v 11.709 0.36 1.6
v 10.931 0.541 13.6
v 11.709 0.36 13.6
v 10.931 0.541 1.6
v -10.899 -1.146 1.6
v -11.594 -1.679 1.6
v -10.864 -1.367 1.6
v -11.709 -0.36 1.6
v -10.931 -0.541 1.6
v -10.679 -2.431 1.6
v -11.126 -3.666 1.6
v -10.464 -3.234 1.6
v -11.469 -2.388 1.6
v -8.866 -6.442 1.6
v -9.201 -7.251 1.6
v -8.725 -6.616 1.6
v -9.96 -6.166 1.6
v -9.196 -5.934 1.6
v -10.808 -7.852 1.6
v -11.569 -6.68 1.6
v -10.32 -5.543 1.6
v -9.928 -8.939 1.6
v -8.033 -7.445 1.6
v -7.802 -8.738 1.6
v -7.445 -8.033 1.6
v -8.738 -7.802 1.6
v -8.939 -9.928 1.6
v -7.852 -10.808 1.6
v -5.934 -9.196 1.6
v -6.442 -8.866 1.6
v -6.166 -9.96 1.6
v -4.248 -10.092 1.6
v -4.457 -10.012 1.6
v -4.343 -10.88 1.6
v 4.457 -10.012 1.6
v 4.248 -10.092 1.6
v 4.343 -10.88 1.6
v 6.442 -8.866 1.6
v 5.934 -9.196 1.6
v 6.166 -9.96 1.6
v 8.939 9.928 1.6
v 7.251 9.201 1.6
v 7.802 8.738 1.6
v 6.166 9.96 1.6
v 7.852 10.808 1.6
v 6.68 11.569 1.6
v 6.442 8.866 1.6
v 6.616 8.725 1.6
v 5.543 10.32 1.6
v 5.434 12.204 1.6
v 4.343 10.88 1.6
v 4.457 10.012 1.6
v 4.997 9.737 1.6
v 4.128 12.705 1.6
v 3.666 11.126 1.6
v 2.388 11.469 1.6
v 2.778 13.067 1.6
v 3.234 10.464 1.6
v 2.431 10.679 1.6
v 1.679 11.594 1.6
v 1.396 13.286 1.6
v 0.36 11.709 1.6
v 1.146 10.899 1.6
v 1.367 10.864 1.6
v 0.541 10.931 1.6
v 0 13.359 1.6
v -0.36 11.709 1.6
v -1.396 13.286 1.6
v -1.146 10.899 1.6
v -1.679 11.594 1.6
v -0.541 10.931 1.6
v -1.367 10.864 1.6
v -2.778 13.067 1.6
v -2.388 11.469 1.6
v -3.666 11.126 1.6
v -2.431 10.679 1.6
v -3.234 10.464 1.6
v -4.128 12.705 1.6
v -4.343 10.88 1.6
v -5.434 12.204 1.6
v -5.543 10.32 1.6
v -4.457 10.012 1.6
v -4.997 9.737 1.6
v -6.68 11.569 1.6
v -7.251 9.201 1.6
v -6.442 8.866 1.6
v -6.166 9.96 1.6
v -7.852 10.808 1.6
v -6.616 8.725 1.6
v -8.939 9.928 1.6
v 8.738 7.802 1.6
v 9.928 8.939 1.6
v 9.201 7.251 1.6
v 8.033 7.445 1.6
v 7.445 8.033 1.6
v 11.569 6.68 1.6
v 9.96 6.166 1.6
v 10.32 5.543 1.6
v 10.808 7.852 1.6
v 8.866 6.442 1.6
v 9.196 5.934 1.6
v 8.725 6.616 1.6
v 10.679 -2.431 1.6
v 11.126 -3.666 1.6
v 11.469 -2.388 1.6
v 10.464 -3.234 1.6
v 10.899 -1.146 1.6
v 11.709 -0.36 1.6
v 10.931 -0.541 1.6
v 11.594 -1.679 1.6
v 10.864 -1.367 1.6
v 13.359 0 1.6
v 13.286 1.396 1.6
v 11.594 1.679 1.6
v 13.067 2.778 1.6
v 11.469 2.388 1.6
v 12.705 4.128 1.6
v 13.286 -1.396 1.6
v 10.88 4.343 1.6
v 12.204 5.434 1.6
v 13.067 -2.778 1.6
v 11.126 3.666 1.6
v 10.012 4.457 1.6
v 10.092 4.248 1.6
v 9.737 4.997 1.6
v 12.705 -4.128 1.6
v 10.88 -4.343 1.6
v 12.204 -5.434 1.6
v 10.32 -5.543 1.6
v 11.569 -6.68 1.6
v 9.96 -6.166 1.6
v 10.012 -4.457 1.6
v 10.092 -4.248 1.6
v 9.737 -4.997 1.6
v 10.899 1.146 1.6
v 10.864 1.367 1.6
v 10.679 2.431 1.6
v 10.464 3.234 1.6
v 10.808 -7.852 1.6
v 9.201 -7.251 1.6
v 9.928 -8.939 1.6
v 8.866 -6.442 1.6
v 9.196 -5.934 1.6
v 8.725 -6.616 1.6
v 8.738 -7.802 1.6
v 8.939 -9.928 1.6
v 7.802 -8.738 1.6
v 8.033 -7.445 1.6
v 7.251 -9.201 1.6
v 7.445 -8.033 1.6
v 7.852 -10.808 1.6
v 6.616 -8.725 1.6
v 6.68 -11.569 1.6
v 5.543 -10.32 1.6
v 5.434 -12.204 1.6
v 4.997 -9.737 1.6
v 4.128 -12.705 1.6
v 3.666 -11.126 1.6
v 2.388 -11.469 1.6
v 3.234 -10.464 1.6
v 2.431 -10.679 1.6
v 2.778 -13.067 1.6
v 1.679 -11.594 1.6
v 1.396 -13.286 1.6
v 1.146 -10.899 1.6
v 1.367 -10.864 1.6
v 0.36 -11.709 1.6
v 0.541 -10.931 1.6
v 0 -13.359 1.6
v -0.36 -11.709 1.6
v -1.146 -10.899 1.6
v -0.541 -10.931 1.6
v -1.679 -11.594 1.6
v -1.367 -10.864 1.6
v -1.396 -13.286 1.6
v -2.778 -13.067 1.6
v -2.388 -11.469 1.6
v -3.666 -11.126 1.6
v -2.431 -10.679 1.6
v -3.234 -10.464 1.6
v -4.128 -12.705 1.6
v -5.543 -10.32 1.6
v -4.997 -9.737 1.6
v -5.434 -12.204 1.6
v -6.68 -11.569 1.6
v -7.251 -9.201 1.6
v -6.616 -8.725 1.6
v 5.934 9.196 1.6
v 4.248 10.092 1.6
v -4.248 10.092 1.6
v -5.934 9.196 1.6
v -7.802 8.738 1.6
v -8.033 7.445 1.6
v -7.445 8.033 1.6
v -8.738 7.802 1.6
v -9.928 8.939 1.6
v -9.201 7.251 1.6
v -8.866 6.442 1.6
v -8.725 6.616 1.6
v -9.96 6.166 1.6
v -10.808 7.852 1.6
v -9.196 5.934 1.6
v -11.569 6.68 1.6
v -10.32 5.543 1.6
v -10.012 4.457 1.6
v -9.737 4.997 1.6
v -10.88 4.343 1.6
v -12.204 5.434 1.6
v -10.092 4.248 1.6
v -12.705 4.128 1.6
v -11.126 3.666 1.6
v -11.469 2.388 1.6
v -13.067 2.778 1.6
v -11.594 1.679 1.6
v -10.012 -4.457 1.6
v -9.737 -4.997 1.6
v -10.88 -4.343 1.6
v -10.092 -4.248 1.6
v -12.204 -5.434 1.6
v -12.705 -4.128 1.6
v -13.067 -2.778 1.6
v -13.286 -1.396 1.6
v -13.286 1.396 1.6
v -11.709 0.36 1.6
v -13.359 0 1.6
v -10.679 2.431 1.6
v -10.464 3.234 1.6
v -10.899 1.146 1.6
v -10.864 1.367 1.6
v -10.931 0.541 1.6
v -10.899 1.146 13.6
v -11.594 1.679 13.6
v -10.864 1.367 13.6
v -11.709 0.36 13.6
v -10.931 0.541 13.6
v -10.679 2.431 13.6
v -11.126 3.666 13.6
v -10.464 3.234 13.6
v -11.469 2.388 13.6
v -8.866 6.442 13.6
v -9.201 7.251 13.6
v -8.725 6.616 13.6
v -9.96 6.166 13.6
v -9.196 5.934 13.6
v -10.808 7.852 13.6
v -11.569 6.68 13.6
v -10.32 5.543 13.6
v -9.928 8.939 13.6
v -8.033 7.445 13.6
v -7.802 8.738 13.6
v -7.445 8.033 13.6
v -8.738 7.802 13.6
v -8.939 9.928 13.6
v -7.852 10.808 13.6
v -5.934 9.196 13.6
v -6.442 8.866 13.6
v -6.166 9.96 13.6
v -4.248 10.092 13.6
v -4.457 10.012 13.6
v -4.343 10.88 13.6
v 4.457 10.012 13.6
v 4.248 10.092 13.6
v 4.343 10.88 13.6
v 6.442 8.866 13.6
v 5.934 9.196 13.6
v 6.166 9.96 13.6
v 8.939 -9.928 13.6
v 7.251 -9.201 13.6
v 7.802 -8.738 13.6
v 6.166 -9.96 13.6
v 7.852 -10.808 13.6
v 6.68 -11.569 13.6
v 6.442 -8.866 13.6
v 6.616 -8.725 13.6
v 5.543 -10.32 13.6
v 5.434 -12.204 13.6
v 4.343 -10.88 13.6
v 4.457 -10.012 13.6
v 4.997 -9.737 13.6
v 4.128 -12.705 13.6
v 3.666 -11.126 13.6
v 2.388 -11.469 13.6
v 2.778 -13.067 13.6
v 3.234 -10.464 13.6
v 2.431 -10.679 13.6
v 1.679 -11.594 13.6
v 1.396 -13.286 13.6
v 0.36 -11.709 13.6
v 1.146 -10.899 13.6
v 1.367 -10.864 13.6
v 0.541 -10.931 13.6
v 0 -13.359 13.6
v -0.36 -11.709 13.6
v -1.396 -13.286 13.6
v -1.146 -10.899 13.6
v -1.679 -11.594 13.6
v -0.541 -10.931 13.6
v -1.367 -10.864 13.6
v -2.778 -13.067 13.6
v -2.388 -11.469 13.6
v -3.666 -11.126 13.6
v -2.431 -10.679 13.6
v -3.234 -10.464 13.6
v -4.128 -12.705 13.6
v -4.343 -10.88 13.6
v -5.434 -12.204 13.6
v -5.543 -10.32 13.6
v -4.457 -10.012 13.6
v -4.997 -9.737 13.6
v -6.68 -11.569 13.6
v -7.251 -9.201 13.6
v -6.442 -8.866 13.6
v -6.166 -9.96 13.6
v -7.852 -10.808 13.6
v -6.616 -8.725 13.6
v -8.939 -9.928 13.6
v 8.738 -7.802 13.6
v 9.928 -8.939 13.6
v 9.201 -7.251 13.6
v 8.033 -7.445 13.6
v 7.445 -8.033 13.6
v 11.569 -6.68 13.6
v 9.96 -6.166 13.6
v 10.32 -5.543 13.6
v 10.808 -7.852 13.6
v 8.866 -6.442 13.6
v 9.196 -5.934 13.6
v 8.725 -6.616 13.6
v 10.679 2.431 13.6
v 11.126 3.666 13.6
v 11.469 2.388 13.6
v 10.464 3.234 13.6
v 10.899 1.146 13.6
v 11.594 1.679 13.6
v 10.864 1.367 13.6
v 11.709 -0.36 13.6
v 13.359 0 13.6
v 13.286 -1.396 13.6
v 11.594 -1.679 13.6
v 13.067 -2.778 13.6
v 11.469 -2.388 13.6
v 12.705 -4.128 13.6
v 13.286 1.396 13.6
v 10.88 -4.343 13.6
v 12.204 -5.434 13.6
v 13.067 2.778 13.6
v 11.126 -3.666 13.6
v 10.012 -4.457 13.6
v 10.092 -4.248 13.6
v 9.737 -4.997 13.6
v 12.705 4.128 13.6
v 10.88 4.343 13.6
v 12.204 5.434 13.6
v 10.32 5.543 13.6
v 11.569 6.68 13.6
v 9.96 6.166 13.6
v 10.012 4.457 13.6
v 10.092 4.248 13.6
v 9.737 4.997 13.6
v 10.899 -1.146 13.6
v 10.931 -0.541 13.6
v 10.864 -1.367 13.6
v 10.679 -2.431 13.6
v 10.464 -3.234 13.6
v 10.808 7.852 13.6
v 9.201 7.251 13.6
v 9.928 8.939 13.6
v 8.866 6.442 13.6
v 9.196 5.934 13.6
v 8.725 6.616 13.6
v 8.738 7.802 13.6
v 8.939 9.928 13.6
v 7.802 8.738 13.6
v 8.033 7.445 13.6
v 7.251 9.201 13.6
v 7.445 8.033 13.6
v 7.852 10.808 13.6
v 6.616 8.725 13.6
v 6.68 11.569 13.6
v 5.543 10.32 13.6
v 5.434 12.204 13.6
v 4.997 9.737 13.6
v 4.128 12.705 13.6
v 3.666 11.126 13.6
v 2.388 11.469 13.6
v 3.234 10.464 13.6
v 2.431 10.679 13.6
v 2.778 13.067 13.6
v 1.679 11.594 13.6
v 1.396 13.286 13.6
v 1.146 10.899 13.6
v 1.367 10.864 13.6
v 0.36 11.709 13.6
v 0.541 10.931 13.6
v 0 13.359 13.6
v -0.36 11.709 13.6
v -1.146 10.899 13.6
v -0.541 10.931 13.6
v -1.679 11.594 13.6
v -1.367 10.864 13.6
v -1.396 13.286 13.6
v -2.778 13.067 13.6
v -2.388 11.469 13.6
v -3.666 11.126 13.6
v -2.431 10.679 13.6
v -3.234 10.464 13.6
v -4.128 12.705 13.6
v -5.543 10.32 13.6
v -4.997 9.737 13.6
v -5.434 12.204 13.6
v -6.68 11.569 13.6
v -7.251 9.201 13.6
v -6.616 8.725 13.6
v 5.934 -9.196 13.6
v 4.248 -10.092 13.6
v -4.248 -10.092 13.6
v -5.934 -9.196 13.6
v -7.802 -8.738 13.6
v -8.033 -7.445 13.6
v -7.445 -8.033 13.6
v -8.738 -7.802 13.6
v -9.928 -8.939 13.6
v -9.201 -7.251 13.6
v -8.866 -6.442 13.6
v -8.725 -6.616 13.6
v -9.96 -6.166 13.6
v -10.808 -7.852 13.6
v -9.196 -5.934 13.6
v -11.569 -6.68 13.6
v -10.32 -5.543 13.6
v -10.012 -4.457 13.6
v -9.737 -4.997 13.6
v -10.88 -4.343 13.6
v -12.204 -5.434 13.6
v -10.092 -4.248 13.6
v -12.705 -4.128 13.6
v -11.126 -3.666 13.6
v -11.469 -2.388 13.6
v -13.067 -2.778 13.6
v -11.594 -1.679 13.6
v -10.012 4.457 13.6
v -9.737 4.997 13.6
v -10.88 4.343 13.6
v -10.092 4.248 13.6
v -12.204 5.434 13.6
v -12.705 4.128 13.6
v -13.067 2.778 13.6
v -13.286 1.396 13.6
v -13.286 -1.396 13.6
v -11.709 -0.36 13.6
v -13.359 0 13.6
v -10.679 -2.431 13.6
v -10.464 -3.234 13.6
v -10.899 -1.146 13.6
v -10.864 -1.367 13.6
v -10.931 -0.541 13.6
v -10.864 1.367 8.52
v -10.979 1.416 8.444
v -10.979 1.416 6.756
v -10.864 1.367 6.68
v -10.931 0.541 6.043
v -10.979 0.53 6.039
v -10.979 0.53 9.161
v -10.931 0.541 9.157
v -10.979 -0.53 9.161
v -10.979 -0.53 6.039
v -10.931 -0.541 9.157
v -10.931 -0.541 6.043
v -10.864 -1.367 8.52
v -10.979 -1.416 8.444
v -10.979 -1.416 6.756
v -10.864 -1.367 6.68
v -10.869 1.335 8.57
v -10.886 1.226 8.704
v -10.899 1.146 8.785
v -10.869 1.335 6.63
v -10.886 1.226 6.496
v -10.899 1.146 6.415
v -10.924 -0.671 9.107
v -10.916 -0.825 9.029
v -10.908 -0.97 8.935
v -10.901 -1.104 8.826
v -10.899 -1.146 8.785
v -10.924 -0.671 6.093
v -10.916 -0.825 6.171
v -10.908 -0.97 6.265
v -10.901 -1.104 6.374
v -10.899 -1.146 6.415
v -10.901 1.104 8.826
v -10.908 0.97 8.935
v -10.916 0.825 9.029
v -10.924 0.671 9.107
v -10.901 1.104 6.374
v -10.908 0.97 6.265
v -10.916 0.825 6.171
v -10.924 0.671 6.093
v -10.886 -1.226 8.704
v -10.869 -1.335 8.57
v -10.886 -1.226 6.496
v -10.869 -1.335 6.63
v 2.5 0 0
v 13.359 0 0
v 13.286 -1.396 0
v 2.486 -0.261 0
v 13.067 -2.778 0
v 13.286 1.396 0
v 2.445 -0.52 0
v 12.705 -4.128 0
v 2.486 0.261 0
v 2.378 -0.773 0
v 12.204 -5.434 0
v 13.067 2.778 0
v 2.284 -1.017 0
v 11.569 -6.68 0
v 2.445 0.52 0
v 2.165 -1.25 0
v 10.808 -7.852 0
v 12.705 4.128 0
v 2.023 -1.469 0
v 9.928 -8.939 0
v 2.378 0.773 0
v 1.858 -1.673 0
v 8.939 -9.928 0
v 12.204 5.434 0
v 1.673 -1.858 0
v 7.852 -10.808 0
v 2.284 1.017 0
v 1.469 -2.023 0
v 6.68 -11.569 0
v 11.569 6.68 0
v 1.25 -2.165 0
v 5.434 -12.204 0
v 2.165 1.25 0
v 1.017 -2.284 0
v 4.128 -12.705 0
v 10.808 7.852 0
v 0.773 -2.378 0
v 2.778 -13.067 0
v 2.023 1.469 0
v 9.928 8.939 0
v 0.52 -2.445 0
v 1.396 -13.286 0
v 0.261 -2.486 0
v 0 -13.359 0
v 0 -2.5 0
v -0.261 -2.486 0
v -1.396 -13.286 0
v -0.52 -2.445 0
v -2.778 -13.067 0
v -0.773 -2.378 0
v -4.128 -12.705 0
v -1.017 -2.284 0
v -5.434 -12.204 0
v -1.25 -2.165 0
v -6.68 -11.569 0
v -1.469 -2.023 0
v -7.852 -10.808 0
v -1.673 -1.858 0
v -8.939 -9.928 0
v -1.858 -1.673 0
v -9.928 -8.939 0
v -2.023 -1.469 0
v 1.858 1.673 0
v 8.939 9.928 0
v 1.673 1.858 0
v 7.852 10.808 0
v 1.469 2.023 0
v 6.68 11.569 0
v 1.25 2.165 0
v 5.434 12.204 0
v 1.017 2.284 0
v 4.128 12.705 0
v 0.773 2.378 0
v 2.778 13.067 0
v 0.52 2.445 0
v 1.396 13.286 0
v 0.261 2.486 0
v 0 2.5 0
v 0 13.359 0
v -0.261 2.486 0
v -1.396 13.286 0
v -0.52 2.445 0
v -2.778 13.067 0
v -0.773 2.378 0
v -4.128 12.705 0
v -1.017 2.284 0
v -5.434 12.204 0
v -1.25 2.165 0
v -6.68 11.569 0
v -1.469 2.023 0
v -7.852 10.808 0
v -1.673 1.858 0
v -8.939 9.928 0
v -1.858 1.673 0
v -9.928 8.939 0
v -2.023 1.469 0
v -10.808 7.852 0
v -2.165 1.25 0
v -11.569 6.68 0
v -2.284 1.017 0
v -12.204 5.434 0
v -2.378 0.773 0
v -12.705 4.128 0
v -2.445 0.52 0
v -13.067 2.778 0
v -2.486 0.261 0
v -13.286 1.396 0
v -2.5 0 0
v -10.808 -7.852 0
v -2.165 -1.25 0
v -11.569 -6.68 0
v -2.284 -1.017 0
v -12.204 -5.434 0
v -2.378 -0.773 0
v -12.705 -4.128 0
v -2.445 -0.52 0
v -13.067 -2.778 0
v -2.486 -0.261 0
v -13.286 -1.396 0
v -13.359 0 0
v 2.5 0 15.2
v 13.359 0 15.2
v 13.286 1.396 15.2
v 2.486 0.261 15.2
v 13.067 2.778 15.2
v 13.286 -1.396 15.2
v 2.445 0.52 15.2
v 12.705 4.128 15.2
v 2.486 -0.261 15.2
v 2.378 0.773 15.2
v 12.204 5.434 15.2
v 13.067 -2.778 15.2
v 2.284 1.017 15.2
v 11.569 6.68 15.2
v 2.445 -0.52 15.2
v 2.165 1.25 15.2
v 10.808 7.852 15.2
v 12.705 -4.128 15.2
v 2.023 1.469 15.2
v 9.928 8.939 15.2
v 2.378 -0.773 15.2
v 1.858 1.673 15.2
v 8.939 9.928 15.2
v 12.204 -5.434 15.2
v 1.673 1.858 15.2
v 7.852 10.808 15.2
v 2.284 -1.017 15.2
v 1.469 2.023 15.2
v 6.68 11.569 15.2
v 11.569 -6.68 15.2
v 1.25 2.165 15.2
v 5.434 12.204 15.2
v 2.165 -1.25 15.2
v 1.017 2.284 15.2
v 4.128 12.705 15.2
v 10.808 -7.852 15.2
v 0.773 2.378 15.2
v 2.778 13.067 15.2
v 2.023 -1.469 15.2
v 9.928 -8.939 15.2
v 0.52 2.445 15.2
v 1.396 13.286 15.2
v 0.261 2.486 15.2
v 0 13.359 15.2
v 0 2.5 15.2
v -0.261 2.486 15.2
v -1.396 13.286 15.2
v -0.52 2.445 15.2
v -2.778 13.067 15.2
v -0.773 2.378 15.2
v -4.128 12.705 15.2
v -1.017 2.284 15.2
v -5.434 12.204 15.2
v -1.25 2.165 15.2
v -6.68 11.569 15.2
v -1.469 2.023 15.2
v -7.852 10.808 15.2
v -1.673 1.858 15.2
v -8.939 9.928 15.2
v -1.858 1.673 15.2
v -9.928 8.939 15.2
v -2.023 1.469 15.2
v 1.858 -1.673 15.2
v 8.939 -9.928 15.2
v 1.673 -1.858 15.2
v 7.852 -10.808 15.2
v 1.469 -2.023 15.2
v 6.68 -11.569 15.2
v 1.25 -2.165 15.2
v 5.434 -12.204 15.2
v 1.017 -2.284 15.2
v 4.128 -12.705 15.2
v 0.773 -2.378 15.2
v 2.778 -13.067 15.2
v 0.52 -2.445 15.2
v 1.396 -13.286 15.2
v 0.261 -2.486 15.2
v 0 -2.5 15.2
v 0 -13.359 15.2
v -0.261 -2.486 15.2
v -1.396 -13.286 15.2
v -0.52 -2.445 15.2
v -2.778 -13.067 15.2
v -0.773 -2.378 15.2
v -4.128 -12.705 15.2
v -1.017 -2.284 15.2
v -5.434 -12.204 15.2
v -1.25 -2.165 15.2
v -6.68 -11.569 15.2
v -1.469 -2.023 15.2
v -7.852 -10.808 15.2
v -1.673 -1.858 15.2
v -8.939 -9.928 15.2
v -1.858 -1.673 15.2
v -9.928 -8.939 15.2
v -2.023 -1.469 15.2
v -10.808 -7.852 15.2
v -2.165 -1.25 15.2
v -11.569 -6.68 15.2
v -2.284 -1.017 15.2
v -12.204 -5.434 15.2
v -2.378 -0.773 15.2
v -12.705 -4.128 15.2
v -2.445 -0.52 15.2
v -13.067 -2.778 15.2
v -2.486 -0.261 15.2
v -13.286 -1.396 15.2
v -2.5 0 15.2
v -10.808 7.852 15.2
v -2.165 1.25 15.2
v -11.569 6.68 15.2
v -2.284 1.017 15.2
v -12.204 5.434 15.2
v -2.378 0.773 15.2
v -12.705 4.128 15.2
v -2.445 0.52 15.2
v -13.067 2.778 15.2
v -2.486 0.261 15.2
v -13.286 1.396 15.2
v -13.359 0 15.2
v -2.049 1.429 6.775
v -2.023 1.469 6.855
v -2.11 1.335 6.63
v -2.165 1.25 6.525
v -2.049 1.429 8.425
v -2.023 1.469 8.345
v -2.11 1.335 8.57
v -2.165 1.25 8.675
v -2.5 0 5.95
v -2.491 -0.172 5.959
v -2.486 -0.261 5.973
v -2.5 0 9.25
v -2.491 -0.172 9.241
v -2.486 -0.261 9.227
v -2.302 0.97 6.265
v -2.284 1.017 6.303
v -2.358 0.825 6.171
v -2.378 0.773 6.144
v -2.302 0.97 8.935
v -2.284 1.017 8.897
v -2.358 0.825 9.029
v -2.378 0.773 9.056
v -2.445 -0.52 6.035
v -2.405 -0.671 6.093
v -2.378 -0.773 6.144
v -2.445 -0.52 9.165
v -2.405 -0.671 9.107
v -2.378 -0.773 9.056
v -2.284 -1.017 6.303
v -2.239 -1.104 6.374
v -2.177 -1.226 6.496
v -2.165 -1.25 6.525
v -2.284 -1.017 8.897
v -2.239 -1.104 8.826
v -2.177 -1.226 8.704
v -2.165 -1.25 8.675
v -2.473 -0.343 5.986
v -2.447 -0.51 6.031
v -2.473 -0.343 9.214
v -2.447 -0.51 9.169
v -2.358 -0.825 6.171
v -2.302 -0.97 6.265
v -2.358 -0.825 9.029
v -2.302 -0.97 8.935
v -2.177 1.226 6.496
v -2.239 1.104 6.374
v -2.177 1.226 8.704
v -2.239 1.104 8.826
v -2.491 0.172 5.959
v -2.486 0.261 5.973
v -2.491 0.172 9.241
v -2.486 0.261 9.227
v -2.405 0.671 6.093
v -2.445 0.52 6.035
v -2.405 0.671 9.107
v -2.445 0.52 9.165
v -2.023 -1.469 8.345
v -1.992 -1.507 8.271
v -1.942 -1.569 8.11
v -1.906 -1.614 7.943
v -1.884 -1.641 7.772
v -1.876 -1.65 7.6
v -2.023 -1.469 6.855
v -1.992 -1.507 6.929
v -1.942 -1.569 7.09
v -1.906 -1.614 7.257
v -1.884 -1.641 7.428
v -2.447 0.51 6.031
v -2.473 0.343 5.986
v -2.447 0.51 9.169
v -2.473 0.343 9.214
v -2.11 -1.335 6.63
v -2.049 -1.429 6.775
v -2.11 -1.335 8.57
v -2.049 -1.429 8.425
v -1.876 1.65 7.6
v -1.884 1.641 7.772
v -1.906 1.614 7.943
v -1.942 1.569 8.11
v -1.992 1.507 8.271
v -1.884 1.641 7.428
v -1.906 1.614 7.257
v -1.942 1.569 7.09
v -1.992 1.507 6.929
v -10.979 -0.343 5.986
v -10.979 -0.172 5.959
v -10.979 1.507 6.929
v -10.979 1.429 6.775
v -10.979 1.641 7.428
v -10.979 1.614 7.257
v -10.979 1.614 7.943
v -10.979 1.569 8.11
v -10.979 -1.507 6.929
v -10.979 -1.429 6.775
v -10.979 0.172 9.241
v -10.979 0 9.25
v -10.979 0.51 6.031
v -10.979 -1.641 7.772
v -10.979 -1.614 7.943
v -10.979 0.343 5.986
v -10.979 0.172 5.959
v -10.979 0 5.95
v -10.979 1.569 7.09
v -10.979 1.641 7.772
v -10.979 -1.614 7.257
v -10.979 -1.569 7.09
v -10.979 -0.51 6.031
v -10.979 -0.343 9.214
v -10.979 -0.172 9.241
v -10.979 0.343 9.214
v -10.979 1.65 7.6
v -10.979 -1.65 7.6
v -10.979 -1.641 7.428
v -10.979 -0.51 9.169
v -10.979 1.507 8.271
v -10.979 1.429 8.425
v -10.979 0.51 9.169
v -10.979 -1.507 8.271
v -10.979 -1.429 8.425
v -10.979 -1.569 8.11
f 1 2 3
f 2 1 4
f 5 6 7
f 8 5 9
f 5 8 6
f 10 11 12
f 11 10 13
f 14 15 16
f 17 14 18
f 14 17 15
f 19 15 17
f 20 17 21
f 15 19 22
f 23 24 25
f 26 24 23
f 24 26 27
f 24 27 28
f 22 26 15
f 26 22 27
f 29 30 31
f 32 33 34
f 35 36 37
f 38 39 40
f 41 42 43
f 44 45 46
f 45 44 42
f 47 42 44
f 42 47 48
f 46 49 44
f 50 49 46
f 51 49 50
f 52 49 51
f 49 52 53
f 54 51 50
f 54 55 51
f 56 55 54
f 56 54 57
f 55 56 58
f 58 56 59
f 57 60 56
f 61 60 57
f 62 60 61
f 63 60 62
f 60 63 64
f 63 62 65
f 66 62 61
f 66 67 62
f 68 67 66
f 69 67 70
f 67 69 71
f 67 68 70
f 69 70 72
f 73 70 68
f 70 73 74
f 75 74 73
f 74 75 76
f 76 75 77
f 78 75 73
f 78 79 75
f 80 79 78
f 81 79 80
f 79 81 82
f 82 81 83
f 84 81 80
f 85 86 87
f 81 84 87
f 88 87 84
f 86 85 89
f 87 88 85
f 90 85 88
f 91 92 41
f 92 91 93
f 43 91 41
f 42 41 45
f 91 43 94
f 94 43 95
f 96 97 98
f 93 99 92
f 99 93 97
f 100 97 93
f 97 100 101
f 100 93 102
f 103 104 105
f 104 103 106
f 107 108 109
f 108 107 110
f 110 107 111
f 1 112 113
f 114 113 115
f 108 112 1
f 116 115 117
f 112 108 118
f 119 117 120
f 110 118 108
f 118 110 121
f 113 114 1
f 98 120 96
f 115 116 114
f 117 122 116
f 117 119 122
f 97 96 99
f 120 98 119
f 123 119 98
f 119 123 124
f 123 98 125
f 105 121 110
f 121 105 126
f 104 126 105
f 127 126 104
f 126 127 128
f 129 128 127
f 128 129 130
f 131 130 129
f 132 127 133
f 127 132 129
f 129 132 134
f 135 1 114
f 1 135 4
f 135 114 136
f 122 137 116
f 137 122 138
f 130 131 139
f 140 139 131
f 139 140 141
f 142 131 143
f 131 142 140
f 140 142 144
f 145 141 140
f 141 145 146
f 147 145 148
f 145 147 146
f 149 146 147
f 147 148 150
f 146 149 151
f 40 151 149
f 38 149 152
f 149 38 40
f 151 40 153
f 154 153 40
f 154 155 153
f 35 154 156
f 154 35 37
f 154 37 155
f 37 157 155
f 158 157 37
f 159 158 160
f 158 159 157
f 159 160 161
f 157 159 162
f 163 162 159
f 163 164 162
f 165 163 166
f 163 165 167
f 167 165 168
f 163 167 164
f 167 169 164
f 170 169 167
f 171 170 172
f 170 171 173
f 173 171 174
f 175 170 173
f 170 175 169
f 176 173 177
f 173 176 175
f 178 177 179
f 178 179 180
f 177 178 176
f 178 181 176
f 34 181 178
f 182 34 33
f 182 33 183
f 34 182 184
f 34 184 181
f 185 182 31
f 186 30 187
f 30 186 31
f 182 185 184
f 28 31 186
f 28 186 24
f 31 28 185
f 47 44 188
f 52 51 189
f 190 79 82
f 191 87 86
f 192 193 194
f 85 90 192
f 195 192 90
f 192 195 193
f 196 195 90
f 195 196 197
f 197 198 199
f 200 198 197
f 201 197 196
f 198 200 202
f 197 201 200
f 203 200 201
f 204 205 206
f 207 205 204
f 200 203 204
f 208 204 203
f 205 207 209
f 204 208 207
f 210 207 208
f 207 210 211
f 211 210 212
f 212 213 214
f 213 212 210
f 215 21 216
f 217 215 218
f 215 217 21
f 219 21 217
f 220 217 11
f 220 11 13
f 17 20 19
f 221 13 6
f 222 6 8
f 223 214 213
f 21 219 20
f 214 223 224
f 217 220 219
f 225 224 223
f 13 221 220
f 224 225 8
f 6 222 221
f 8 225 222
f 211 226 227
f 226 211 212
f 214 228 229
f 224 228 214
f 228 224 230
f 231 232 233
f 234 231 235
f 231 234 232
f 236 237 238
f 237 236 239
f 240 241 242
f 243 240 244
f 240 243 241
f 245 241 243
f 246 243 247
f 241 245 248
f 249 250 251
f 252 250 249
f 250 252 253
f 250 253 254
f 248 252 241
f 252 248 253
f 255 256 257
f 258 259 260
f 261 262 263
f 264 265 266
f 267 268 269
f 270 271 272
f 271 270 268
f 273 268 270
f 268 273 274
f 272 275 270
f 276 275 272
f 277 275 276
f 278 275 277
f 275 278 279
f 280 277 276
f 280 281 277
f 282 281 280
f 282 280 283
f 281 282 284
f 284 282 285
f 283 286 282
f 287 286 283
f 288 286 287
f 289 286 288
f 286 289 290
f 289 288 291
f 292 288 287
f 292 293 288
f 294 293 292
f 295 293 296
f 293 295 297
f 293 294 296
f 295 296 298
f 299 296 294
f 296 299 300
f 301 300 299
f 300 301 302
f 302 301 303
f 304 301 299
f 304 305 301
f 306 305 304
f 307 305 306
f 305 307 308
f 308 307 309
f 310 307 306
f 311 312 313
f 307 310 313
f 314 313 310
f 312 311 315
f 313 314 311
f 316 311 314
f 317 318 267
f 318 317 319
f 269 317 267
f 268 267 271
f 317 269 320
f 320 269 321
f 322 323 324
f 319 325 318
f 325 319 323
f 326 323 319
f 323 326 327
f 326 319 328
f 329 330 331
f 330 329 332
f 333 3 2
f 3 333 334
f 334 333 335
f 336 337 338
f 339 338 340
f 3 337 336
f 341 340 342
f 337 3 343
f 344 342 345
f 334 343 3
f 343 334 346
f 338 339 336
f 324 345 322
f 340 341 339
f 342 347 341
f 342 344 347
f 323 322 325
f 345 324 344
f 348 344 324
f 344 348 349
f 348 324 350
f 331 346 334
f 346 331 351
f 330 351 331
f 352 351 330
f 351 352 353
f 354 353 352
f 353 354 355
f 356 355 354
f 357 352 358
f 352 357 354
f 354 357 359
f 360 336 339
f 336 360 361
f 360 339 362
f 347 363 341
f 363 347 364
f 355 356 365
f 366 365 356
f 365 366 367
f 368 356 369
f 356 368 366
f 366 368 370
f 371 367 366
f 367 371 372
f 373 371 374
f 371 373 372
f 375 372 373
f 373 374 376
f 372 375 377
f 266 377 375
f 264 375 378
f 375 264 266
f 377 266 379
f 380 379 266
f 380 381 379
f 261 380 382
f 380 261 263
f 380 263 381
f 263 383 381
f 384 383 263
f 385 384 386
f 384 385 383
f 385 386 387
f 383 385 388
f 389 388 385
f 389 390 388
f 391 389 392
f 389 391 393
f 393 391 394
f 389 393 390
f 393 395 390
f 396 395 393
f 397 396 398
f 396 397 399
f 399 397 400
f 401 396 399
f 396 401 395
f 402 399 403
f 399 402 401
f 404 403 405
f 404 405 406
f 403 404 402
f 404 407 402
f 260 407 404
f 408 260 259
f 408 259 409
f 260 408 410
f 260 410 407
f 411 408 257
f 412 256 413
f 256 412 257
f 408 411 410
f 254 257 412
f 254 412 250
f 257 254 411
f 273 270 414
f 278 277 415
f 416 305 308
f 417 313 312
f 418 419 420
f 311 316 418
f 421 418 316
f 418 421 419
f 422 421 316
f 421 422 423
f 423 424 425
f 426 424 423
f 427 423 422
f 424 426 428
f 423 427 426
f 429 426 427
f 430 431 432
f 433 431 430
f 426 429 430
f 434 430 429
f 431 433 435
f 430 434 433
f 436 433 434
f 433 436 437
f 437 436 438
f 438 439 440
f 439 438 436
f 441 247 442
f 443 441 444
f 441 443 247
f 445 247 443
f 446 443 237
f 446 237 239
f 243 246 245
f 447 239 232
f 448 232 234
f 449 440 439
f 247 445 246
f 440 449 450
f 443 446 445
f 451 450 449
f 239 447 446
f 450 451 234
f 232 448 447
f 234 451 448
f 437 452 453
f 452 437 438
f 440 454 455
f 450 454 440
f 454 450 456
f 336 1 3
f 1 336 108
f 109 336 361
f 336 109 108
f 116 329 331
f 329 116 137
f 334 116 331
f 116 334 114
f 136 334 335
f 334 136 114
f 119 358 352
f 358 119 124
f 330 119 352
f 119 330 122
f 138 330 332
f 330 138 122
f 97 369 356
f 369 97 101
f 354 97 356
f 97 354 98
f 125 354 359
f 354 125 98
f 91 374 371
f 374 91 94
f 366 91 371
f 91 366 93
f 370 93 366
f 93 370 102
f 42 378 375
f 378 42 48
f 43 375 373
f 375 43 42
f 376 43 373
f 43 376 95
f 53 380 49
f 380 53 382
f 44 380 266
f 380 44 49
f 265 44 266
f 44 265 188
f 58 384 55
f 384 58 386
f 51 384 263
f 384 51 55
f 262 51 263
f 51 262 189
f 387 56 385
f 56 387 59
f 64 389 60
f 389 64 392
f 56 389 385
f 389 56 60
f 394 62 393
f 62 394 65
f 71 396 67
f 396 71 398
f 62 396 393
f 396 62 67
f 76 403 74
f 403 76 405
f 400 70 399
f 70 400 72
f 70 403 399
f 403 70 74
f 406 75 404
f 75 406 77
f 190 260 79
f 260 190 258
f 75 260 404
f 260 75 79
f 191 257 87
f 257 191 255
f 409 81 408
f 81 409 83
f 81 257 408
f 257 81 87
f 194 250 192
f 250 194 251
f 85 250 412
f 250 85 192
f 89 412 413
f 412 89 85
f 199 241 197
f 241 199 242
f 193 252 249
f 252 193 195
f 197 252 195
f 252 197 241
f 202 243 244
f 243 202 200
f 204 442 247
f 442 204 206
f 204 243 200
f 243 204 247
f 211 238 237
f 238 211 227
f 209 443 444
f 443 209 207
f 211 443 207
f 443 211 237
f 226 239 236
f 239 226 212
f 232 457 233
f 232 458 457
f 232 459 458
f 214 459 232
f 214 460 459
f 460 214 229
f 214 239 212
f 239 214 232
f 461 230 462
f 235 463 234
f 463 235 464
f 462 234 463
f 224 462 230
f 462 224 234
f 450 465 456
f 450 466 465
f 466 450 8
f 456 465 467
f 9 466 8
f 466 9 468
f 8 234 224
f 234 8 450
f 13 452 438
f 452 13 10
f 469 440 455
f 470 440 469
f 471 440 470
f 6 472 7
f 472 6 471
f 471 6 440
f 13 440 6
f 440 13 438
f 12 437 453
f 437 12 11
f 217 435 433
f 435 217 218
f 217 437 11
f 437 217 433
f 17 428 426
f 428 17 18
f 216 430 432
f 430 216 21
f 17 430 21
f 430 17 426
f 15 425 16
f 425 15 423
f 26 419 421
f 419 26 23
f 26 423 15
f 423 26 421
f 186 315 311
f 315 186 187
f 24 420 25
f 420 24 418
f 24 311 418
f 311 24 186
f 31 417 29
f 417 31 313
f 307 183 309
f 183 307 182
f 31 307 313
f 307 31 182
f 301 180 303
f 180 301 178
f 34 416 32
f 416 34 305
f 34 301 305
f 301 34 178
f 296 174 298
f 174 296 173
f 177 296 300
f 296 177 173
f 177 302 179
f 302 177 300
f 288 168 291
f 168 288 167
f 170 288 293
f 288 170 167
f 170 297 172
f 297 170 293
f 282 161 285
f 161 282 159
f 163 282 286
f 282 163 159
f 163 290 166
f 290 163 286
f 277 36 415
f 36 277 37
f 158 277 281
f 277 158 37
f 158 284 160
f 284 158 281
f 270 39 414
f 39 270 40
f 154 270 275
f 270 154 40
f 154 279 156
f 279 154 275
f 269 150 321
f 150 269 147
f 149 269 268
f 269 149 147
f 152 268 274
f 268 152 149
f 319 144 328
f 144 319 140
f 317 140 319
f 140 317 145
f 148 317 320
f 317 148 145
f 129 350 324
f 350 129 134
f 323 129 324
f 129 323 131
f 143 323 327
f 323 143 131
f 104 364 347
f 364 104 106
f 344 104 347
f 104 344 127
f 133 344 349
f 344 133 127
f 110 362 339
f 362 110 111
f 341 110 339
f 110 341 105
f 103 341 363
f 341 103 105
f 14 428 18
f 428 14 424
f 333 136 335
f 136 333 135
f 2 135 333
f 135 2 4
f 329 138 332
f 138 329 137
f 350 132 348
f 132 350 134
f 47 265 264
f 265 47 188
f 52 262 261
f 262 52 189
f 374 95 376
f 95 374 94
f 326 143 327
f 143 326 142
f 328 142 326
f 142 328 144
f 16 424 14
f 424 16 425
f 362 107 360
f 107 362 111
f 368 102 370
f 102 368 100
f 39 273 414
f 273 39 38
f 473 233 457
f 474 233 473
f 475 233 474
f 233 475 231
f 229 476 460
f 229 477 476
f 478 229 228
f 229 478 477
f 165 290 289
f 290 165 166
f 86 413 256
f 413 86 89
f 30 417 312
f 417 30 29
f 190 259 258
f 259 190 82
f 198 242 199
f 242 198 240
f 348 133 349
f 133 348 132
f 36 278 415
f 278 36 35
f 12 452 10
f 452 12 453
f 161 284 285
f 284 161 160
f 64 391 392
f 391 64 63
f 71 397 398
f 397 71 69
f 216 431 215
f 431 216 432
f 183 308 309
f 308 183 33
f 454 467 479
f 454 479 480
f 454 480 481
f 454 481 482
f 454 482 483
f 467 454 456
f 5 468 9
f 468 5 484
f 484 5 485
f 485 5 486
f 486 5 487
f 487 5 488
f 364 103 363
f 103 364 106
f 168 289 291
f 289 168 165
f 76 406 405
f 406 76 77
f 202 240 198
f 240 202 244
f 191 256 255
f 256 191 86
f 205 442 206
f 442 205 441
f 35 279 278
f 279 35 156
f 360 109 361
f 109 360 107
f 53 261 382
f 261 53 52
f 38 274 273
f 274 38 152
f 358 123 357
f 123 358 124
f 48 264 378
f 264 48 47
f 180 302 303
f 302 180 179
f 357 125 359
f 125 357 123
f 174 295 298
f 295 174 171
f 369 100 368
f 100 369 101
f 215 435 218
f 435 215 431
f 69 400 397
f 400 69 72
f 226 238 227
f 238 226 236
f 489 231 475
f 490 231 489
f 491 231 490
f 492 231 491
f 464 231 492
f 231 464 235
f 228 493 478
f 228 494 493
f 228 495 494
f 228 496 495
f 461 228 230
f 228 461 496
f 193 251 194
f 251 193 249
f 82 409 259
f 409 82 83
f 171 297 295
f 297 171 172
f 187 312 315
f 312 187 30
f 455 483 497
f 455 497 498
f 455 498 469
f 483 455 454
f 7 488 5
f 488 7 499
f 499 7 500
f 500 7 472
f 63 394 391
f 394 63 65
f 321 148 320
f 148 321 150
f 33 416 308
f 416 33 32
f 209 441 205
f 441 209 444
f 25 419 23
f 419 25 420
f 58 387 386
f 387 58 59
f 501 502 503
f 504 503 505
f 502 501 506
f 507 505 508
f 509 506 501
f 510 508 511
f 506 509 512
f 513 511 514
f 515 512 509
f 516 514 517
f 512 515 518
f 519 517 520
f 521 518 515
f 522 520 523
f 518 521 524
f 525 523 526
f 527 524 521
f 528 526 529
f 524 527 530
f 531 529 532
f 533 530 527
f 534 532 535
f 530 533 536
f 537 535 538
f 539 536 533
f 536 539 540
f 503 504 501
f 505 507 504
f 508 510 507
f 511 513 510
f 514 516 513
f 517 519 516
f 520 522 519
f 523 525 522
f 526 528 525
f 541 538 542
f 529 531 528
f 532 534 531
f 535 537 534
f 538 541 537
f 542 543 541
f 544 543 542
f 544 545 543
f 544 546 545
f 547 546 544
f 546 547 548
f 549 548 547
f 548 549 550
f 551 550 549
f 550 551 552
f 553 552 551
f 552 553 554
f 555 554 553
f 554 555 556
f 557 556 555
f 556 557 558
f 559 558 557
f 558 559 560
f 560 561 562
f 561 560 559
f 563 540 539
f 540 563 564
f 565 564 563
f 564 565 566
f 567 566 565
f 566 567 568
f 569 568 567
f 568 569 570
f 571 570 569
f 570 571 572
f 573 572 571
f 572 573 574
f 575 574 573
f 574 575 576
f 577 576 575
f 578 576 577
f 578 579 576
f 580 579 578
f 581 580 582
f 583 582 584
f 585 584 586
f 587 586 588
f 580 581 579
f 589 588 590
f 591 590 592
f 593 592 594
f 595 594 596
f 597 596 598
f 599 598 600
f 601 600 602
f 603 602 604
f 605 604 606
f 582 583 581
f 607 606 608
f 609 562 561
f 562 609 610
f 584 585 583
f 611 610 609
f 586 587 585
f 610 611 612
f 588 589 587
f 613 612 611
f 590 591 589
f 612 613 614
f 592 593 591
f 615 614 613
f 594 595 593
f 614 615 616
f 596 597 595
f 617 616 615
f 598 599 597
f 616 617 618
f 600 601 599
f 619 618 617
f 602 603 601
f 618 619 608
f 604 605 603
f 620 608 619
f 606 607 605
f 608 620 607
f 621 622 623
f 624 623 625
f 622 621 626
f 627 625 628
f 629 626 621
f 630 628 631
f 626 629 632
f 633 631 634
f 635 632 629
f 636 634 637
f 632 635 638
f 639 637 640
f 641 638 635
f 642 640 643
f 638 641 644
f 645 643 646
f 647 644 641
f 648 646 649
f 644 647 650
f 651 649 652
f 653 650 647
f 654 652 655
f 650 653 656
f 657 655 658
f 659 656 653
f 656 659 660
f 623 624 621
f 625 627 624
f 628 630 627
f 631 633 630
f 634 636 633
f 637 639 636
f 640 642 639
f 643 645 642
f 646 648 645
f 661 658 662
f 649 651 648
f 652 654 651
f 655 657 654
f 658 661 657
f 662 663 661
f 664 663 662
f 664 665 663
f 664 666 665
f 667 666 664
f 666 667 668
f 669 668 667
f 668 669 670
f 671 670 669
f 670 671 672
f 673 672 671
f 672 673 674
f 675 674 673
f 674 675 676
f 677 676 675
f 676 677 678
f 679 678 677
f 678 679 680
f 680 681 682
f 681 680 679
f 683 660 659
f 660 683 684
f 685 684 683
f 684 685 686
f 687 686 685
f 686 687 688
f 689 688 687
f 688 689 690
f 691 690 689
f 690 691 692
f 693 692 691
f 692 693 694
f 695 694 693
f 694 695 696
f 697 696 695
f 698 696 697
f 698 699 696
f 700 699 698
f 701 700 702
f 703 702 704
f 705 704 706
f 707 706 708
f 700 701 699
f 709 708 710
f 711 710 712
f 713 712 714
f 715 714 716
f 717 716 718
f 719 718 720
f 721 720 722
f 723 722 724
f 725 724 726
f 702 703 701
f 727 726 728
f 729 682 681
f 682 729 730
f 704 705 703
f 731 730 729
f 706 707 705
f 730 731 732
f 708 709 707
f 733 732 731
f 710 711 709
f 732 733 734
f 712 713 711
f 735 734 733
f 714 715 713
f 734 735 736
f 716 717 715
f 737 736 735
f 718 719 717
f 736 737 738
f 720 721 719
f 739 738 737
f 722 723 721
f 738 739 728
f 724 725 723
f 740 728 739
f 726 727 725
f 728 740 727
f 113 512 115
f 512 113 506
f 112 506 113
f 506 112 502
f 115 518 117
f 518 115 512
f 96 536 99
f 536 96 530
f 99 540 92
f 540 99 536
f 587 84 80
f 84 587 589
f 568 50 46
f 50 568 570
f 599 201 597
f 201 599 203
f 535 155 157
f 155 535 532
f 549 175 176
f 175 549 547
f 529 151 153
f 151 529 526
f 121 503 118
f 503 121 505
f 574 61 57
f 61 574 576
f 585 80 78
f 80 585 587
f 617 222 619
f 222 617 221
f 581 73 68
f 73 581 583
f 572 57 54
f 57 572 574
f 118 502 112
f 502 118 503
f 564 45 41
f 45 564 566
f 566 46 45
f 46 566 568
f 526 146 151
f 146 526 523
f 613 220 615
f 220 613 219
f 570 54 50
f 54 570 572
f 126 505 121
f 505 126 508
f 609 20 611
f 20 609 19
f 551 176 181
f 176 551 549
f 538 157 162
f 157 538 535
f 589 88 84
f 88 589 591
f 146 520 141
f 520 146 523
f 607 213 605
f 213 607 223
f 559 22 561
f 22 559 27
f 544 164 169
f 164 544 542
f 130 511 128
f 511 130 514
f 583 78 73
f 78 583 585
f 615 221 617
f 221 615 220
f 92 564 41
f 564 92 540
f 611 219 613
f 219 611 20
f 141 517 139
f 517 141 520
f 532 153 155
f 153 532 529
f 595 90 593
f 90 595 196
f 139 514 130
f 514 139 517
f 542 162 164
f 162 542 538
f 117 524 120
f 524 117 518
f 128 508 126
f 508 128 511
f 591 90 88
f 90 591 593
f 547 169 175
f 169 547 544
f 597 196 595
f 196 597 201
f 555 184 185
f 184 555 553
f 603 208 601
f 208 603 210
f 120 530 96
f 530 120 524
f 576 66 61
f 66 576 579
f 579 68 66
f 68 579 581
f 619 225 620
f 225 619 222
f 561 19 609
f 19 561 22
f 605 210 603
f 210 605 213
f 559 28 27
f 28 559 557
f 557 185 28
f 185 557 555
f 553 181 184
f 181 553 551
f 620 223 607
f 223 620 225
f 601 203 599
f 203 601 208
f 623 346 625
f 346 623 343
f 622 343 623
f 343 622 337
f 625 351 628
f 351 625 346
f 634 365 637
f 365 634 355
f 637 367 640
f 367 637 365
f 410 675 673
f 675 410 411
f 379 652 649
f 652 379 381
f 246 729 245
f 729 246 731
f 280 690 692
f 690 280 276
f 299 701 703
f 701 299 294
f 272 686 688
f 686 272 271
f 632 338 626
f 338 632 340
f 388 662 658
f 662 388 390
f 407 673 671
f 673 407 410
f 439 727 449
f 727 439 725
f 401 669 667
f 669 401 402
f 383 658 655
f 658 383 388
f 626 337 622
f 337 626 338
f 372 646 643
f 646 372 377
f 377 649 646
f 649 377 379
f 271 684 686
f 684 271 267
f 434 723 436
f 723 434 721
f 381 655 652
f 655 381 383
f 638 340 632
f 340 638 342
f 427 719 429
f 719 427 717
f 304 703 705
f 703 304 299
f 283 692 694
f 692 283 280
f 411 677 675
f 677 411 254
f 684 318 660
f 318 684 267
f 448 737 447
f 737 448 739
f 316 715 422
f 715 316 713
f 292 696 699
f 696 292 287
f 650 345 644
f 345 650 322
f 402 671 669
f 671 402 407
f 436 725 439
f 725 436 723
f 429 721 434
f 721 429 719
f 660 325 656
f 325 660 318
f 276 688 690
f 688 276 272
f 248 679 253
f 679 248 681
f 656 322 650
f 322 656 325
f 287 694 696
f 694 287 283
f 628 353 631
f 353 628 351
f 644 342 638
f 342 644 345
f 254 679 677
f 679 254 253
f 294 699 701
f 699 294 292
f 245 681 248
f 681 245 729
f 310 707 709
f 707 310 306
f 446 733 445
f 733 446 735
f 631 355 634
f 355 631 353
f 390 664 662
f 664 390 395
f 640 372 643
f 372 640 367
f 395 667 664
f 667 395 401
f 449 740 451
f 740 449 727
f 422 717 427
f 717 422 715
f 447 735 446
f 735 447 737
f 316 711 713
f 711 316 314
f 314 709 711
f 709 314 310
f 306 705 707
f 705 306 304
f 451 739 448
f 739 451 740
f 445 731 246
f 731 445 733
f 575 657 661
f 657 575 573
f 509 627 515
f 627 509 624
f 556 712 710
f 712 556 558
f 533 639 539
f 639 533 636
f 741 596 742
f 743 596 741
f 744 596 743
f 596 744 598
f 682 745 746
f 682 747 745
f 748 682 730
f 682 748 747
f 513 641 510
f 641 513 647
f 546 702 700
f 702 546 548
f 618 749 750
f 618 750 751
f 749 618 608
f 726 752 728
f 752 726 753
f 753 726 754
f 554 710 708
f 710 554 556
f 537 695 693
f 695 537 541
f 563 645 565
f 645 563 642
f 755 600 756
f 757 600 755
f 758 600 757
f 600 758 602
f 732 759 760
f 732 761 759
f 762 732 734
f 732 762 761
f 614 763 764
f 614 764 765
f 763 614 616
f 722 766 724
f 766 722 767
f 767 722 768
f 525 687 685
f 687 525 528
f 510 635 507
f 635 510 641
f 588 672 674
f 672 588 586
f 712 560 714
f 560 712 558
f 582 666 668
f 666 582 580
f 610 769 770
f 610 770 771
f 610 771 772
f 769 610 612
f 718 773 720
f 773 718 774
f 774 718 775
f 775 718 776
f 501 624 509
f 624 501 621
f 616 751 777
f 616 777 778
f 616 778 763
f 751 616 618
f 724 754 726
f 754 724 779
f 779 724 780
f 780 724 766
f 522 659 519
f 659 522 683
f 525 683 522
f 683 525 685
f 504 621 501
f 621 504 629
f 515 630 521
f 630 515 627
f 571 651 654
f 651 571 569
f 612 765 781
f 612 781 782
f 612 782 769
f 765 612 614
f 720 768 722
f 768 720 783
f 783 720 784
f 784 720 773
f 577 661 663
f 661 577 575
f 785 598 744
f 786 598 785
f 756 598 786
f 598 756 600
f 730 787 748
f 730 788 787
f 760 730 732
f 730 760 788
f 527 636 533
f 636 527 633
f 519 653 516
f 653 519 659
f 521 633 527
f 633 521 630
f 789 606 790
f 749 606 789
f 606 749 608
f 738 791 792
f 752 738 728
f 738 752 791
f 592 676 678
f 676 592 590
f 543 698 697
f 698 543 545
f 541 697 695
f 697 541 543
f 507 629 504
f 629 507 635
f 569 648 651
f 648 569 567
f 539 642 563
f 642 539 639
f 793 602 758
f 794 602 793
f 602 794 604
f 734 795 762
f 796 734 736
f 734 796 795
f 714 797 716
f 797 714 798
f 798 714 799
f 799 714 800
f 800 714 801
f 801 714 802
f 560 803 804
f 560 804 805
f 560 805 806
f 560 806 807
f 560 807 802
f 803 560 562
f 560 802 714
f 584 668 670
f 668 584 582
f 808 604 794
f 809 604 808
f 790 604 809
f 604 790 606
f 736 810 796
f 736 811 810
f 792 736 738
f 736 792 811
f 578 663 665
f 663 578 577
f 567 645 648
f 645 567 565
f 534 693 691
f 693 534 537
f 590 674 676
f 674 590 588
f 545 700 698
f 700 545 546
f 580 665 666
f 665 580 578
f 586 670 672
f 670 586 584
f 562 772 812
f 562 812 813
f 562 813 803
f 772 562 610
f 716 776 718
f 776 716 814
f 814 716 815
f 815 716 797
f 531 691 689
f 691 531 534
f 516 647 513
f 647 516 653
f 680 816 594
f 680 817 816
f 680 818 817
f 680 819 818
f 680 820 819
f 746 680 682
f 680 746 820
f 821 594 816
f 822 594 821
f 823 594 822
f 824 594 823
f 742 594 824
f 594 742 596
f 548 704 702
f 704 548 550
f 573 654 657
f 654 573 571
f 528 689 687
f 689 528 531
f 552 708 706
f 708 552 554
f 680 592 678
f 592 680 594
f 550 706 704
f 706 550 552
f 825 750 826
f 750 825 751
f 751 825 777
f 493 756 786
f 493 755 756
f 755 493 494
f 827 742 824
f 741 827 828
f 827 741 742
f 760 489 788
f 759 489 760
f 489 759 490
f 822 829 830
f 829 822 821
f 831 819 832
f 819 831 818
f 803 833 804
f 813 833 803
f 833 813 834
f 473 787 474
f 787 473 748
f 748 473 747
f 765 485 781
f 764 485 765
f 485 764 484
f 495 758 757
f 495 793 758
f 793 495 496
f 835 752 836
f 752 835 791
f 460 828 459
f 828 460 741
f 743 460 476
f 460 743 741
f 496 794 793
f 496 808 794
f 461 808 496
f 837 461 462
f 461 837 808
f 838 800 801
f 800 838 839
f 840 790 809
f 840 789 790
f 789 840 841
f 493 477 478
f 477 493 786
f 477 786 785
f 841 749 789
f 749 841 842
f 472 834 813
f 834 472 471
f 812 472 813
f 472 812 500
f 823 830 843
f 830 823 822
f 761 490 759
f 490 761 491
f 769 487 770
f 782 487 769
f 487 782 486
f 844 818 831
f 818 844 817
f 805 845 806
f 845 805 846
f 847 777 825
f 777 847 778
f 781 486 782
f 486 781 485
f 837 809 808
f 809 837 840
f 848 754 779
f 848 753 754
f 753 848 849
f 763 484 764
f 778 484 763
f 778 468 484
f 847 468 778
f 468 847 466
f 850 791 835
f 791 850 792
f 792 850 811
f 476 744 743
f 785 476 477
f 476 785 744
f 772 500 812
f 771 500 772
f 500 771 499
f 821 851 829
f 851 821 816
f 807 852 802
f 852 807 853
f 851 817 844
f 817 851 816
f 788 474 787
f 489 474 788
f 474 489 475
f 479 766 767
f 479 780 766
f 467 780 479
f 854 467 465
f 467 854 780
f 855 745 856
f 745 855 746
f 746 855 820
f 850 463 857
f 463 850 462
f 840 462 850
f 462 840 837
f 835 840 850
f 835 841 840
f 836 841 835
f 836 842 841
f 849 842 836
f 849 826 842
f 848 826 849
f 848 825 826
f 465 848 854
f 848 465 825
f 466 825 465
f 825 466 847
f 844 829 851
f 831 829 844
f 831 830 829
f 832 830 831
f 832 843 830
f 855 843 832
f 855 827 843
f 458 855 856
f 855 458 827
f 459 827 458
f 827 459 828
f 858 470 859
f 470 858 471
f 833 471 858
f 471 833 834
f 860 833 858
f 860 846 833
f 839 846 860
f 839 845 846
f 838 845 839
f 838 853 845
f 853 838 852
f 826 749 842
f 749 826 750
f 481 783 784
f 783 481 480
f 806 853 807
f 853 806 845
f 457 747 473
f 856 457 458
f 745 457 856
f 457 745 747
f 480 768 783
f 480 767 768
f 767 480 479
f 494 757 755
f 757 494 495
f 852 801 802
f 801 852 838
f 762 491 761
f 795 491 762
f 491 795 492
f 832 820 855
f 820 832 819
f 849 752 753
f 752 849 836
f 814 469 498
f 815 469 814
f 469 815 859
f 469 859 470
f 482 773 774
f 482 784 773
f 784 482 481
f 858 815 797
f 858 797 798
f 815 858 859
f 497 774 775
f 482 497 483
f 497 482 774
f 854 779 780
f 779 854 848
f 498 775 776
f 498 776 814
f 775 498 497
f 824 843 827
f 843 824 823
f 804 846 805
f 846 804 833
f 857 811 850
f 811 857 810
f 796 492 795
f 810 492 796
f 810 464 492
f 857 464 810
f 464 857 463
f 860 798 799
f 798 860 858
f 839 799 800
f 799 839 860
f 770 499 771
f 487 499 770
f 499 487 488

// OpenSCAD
// GT2 pulley, 36 teeth for 12 mm belt.
$fn = 60;
eps = 0.02;
teeth = 36;
belt_pitch = 2;
belt_w = 12;
shaft_d = 5;
set_screw_d = 3.3;
tooth_depth = 0.75;
tooth_overlap = 0.28;
tooth_base_w = 1.2;
tooth_tip_w = 0.72;
flange_t = 1.6;
core_d = teeth * belt_pitch / PI - 1.0;
body_h = belt_w + 2 * flange_t;
module tooth() {
    linear_extrude(height = belt_w)
        polygon(points = [[-tooth_overlap, -tooth_base_w / 2], [tooth_depth, -tooth_tip_w / 2], [tooth_depth, tooth_tip_w / 2], [-tooth_overlap, tooth_base_w / 2]]);
}
difference() {
    union() {
        cylinder(d = core_d, h = body_h);
        cylinder(d = core_d + 4.8, h = flange_t);
        translate([0, 0, body_h - flange_t]) cylinder(d = core_d + 4.8, h = flange_t);
        for (i = [0 : teeth - 1]) rotate([0, 0, i * 360 / teeth]) translate([core_d / 2, 0, flange_t]) tooth();
    }
    translate([0, 0, -eps]) cylinder(d = shaft_d, h = body_h + 2 * eps);
    translate([-core_d / 2 - eps, 0, body_h / 2]) rotate([0, 90, 0]) cylinder(d = set_screw_d, h = core_d / 2 + 2 * eps);
}
